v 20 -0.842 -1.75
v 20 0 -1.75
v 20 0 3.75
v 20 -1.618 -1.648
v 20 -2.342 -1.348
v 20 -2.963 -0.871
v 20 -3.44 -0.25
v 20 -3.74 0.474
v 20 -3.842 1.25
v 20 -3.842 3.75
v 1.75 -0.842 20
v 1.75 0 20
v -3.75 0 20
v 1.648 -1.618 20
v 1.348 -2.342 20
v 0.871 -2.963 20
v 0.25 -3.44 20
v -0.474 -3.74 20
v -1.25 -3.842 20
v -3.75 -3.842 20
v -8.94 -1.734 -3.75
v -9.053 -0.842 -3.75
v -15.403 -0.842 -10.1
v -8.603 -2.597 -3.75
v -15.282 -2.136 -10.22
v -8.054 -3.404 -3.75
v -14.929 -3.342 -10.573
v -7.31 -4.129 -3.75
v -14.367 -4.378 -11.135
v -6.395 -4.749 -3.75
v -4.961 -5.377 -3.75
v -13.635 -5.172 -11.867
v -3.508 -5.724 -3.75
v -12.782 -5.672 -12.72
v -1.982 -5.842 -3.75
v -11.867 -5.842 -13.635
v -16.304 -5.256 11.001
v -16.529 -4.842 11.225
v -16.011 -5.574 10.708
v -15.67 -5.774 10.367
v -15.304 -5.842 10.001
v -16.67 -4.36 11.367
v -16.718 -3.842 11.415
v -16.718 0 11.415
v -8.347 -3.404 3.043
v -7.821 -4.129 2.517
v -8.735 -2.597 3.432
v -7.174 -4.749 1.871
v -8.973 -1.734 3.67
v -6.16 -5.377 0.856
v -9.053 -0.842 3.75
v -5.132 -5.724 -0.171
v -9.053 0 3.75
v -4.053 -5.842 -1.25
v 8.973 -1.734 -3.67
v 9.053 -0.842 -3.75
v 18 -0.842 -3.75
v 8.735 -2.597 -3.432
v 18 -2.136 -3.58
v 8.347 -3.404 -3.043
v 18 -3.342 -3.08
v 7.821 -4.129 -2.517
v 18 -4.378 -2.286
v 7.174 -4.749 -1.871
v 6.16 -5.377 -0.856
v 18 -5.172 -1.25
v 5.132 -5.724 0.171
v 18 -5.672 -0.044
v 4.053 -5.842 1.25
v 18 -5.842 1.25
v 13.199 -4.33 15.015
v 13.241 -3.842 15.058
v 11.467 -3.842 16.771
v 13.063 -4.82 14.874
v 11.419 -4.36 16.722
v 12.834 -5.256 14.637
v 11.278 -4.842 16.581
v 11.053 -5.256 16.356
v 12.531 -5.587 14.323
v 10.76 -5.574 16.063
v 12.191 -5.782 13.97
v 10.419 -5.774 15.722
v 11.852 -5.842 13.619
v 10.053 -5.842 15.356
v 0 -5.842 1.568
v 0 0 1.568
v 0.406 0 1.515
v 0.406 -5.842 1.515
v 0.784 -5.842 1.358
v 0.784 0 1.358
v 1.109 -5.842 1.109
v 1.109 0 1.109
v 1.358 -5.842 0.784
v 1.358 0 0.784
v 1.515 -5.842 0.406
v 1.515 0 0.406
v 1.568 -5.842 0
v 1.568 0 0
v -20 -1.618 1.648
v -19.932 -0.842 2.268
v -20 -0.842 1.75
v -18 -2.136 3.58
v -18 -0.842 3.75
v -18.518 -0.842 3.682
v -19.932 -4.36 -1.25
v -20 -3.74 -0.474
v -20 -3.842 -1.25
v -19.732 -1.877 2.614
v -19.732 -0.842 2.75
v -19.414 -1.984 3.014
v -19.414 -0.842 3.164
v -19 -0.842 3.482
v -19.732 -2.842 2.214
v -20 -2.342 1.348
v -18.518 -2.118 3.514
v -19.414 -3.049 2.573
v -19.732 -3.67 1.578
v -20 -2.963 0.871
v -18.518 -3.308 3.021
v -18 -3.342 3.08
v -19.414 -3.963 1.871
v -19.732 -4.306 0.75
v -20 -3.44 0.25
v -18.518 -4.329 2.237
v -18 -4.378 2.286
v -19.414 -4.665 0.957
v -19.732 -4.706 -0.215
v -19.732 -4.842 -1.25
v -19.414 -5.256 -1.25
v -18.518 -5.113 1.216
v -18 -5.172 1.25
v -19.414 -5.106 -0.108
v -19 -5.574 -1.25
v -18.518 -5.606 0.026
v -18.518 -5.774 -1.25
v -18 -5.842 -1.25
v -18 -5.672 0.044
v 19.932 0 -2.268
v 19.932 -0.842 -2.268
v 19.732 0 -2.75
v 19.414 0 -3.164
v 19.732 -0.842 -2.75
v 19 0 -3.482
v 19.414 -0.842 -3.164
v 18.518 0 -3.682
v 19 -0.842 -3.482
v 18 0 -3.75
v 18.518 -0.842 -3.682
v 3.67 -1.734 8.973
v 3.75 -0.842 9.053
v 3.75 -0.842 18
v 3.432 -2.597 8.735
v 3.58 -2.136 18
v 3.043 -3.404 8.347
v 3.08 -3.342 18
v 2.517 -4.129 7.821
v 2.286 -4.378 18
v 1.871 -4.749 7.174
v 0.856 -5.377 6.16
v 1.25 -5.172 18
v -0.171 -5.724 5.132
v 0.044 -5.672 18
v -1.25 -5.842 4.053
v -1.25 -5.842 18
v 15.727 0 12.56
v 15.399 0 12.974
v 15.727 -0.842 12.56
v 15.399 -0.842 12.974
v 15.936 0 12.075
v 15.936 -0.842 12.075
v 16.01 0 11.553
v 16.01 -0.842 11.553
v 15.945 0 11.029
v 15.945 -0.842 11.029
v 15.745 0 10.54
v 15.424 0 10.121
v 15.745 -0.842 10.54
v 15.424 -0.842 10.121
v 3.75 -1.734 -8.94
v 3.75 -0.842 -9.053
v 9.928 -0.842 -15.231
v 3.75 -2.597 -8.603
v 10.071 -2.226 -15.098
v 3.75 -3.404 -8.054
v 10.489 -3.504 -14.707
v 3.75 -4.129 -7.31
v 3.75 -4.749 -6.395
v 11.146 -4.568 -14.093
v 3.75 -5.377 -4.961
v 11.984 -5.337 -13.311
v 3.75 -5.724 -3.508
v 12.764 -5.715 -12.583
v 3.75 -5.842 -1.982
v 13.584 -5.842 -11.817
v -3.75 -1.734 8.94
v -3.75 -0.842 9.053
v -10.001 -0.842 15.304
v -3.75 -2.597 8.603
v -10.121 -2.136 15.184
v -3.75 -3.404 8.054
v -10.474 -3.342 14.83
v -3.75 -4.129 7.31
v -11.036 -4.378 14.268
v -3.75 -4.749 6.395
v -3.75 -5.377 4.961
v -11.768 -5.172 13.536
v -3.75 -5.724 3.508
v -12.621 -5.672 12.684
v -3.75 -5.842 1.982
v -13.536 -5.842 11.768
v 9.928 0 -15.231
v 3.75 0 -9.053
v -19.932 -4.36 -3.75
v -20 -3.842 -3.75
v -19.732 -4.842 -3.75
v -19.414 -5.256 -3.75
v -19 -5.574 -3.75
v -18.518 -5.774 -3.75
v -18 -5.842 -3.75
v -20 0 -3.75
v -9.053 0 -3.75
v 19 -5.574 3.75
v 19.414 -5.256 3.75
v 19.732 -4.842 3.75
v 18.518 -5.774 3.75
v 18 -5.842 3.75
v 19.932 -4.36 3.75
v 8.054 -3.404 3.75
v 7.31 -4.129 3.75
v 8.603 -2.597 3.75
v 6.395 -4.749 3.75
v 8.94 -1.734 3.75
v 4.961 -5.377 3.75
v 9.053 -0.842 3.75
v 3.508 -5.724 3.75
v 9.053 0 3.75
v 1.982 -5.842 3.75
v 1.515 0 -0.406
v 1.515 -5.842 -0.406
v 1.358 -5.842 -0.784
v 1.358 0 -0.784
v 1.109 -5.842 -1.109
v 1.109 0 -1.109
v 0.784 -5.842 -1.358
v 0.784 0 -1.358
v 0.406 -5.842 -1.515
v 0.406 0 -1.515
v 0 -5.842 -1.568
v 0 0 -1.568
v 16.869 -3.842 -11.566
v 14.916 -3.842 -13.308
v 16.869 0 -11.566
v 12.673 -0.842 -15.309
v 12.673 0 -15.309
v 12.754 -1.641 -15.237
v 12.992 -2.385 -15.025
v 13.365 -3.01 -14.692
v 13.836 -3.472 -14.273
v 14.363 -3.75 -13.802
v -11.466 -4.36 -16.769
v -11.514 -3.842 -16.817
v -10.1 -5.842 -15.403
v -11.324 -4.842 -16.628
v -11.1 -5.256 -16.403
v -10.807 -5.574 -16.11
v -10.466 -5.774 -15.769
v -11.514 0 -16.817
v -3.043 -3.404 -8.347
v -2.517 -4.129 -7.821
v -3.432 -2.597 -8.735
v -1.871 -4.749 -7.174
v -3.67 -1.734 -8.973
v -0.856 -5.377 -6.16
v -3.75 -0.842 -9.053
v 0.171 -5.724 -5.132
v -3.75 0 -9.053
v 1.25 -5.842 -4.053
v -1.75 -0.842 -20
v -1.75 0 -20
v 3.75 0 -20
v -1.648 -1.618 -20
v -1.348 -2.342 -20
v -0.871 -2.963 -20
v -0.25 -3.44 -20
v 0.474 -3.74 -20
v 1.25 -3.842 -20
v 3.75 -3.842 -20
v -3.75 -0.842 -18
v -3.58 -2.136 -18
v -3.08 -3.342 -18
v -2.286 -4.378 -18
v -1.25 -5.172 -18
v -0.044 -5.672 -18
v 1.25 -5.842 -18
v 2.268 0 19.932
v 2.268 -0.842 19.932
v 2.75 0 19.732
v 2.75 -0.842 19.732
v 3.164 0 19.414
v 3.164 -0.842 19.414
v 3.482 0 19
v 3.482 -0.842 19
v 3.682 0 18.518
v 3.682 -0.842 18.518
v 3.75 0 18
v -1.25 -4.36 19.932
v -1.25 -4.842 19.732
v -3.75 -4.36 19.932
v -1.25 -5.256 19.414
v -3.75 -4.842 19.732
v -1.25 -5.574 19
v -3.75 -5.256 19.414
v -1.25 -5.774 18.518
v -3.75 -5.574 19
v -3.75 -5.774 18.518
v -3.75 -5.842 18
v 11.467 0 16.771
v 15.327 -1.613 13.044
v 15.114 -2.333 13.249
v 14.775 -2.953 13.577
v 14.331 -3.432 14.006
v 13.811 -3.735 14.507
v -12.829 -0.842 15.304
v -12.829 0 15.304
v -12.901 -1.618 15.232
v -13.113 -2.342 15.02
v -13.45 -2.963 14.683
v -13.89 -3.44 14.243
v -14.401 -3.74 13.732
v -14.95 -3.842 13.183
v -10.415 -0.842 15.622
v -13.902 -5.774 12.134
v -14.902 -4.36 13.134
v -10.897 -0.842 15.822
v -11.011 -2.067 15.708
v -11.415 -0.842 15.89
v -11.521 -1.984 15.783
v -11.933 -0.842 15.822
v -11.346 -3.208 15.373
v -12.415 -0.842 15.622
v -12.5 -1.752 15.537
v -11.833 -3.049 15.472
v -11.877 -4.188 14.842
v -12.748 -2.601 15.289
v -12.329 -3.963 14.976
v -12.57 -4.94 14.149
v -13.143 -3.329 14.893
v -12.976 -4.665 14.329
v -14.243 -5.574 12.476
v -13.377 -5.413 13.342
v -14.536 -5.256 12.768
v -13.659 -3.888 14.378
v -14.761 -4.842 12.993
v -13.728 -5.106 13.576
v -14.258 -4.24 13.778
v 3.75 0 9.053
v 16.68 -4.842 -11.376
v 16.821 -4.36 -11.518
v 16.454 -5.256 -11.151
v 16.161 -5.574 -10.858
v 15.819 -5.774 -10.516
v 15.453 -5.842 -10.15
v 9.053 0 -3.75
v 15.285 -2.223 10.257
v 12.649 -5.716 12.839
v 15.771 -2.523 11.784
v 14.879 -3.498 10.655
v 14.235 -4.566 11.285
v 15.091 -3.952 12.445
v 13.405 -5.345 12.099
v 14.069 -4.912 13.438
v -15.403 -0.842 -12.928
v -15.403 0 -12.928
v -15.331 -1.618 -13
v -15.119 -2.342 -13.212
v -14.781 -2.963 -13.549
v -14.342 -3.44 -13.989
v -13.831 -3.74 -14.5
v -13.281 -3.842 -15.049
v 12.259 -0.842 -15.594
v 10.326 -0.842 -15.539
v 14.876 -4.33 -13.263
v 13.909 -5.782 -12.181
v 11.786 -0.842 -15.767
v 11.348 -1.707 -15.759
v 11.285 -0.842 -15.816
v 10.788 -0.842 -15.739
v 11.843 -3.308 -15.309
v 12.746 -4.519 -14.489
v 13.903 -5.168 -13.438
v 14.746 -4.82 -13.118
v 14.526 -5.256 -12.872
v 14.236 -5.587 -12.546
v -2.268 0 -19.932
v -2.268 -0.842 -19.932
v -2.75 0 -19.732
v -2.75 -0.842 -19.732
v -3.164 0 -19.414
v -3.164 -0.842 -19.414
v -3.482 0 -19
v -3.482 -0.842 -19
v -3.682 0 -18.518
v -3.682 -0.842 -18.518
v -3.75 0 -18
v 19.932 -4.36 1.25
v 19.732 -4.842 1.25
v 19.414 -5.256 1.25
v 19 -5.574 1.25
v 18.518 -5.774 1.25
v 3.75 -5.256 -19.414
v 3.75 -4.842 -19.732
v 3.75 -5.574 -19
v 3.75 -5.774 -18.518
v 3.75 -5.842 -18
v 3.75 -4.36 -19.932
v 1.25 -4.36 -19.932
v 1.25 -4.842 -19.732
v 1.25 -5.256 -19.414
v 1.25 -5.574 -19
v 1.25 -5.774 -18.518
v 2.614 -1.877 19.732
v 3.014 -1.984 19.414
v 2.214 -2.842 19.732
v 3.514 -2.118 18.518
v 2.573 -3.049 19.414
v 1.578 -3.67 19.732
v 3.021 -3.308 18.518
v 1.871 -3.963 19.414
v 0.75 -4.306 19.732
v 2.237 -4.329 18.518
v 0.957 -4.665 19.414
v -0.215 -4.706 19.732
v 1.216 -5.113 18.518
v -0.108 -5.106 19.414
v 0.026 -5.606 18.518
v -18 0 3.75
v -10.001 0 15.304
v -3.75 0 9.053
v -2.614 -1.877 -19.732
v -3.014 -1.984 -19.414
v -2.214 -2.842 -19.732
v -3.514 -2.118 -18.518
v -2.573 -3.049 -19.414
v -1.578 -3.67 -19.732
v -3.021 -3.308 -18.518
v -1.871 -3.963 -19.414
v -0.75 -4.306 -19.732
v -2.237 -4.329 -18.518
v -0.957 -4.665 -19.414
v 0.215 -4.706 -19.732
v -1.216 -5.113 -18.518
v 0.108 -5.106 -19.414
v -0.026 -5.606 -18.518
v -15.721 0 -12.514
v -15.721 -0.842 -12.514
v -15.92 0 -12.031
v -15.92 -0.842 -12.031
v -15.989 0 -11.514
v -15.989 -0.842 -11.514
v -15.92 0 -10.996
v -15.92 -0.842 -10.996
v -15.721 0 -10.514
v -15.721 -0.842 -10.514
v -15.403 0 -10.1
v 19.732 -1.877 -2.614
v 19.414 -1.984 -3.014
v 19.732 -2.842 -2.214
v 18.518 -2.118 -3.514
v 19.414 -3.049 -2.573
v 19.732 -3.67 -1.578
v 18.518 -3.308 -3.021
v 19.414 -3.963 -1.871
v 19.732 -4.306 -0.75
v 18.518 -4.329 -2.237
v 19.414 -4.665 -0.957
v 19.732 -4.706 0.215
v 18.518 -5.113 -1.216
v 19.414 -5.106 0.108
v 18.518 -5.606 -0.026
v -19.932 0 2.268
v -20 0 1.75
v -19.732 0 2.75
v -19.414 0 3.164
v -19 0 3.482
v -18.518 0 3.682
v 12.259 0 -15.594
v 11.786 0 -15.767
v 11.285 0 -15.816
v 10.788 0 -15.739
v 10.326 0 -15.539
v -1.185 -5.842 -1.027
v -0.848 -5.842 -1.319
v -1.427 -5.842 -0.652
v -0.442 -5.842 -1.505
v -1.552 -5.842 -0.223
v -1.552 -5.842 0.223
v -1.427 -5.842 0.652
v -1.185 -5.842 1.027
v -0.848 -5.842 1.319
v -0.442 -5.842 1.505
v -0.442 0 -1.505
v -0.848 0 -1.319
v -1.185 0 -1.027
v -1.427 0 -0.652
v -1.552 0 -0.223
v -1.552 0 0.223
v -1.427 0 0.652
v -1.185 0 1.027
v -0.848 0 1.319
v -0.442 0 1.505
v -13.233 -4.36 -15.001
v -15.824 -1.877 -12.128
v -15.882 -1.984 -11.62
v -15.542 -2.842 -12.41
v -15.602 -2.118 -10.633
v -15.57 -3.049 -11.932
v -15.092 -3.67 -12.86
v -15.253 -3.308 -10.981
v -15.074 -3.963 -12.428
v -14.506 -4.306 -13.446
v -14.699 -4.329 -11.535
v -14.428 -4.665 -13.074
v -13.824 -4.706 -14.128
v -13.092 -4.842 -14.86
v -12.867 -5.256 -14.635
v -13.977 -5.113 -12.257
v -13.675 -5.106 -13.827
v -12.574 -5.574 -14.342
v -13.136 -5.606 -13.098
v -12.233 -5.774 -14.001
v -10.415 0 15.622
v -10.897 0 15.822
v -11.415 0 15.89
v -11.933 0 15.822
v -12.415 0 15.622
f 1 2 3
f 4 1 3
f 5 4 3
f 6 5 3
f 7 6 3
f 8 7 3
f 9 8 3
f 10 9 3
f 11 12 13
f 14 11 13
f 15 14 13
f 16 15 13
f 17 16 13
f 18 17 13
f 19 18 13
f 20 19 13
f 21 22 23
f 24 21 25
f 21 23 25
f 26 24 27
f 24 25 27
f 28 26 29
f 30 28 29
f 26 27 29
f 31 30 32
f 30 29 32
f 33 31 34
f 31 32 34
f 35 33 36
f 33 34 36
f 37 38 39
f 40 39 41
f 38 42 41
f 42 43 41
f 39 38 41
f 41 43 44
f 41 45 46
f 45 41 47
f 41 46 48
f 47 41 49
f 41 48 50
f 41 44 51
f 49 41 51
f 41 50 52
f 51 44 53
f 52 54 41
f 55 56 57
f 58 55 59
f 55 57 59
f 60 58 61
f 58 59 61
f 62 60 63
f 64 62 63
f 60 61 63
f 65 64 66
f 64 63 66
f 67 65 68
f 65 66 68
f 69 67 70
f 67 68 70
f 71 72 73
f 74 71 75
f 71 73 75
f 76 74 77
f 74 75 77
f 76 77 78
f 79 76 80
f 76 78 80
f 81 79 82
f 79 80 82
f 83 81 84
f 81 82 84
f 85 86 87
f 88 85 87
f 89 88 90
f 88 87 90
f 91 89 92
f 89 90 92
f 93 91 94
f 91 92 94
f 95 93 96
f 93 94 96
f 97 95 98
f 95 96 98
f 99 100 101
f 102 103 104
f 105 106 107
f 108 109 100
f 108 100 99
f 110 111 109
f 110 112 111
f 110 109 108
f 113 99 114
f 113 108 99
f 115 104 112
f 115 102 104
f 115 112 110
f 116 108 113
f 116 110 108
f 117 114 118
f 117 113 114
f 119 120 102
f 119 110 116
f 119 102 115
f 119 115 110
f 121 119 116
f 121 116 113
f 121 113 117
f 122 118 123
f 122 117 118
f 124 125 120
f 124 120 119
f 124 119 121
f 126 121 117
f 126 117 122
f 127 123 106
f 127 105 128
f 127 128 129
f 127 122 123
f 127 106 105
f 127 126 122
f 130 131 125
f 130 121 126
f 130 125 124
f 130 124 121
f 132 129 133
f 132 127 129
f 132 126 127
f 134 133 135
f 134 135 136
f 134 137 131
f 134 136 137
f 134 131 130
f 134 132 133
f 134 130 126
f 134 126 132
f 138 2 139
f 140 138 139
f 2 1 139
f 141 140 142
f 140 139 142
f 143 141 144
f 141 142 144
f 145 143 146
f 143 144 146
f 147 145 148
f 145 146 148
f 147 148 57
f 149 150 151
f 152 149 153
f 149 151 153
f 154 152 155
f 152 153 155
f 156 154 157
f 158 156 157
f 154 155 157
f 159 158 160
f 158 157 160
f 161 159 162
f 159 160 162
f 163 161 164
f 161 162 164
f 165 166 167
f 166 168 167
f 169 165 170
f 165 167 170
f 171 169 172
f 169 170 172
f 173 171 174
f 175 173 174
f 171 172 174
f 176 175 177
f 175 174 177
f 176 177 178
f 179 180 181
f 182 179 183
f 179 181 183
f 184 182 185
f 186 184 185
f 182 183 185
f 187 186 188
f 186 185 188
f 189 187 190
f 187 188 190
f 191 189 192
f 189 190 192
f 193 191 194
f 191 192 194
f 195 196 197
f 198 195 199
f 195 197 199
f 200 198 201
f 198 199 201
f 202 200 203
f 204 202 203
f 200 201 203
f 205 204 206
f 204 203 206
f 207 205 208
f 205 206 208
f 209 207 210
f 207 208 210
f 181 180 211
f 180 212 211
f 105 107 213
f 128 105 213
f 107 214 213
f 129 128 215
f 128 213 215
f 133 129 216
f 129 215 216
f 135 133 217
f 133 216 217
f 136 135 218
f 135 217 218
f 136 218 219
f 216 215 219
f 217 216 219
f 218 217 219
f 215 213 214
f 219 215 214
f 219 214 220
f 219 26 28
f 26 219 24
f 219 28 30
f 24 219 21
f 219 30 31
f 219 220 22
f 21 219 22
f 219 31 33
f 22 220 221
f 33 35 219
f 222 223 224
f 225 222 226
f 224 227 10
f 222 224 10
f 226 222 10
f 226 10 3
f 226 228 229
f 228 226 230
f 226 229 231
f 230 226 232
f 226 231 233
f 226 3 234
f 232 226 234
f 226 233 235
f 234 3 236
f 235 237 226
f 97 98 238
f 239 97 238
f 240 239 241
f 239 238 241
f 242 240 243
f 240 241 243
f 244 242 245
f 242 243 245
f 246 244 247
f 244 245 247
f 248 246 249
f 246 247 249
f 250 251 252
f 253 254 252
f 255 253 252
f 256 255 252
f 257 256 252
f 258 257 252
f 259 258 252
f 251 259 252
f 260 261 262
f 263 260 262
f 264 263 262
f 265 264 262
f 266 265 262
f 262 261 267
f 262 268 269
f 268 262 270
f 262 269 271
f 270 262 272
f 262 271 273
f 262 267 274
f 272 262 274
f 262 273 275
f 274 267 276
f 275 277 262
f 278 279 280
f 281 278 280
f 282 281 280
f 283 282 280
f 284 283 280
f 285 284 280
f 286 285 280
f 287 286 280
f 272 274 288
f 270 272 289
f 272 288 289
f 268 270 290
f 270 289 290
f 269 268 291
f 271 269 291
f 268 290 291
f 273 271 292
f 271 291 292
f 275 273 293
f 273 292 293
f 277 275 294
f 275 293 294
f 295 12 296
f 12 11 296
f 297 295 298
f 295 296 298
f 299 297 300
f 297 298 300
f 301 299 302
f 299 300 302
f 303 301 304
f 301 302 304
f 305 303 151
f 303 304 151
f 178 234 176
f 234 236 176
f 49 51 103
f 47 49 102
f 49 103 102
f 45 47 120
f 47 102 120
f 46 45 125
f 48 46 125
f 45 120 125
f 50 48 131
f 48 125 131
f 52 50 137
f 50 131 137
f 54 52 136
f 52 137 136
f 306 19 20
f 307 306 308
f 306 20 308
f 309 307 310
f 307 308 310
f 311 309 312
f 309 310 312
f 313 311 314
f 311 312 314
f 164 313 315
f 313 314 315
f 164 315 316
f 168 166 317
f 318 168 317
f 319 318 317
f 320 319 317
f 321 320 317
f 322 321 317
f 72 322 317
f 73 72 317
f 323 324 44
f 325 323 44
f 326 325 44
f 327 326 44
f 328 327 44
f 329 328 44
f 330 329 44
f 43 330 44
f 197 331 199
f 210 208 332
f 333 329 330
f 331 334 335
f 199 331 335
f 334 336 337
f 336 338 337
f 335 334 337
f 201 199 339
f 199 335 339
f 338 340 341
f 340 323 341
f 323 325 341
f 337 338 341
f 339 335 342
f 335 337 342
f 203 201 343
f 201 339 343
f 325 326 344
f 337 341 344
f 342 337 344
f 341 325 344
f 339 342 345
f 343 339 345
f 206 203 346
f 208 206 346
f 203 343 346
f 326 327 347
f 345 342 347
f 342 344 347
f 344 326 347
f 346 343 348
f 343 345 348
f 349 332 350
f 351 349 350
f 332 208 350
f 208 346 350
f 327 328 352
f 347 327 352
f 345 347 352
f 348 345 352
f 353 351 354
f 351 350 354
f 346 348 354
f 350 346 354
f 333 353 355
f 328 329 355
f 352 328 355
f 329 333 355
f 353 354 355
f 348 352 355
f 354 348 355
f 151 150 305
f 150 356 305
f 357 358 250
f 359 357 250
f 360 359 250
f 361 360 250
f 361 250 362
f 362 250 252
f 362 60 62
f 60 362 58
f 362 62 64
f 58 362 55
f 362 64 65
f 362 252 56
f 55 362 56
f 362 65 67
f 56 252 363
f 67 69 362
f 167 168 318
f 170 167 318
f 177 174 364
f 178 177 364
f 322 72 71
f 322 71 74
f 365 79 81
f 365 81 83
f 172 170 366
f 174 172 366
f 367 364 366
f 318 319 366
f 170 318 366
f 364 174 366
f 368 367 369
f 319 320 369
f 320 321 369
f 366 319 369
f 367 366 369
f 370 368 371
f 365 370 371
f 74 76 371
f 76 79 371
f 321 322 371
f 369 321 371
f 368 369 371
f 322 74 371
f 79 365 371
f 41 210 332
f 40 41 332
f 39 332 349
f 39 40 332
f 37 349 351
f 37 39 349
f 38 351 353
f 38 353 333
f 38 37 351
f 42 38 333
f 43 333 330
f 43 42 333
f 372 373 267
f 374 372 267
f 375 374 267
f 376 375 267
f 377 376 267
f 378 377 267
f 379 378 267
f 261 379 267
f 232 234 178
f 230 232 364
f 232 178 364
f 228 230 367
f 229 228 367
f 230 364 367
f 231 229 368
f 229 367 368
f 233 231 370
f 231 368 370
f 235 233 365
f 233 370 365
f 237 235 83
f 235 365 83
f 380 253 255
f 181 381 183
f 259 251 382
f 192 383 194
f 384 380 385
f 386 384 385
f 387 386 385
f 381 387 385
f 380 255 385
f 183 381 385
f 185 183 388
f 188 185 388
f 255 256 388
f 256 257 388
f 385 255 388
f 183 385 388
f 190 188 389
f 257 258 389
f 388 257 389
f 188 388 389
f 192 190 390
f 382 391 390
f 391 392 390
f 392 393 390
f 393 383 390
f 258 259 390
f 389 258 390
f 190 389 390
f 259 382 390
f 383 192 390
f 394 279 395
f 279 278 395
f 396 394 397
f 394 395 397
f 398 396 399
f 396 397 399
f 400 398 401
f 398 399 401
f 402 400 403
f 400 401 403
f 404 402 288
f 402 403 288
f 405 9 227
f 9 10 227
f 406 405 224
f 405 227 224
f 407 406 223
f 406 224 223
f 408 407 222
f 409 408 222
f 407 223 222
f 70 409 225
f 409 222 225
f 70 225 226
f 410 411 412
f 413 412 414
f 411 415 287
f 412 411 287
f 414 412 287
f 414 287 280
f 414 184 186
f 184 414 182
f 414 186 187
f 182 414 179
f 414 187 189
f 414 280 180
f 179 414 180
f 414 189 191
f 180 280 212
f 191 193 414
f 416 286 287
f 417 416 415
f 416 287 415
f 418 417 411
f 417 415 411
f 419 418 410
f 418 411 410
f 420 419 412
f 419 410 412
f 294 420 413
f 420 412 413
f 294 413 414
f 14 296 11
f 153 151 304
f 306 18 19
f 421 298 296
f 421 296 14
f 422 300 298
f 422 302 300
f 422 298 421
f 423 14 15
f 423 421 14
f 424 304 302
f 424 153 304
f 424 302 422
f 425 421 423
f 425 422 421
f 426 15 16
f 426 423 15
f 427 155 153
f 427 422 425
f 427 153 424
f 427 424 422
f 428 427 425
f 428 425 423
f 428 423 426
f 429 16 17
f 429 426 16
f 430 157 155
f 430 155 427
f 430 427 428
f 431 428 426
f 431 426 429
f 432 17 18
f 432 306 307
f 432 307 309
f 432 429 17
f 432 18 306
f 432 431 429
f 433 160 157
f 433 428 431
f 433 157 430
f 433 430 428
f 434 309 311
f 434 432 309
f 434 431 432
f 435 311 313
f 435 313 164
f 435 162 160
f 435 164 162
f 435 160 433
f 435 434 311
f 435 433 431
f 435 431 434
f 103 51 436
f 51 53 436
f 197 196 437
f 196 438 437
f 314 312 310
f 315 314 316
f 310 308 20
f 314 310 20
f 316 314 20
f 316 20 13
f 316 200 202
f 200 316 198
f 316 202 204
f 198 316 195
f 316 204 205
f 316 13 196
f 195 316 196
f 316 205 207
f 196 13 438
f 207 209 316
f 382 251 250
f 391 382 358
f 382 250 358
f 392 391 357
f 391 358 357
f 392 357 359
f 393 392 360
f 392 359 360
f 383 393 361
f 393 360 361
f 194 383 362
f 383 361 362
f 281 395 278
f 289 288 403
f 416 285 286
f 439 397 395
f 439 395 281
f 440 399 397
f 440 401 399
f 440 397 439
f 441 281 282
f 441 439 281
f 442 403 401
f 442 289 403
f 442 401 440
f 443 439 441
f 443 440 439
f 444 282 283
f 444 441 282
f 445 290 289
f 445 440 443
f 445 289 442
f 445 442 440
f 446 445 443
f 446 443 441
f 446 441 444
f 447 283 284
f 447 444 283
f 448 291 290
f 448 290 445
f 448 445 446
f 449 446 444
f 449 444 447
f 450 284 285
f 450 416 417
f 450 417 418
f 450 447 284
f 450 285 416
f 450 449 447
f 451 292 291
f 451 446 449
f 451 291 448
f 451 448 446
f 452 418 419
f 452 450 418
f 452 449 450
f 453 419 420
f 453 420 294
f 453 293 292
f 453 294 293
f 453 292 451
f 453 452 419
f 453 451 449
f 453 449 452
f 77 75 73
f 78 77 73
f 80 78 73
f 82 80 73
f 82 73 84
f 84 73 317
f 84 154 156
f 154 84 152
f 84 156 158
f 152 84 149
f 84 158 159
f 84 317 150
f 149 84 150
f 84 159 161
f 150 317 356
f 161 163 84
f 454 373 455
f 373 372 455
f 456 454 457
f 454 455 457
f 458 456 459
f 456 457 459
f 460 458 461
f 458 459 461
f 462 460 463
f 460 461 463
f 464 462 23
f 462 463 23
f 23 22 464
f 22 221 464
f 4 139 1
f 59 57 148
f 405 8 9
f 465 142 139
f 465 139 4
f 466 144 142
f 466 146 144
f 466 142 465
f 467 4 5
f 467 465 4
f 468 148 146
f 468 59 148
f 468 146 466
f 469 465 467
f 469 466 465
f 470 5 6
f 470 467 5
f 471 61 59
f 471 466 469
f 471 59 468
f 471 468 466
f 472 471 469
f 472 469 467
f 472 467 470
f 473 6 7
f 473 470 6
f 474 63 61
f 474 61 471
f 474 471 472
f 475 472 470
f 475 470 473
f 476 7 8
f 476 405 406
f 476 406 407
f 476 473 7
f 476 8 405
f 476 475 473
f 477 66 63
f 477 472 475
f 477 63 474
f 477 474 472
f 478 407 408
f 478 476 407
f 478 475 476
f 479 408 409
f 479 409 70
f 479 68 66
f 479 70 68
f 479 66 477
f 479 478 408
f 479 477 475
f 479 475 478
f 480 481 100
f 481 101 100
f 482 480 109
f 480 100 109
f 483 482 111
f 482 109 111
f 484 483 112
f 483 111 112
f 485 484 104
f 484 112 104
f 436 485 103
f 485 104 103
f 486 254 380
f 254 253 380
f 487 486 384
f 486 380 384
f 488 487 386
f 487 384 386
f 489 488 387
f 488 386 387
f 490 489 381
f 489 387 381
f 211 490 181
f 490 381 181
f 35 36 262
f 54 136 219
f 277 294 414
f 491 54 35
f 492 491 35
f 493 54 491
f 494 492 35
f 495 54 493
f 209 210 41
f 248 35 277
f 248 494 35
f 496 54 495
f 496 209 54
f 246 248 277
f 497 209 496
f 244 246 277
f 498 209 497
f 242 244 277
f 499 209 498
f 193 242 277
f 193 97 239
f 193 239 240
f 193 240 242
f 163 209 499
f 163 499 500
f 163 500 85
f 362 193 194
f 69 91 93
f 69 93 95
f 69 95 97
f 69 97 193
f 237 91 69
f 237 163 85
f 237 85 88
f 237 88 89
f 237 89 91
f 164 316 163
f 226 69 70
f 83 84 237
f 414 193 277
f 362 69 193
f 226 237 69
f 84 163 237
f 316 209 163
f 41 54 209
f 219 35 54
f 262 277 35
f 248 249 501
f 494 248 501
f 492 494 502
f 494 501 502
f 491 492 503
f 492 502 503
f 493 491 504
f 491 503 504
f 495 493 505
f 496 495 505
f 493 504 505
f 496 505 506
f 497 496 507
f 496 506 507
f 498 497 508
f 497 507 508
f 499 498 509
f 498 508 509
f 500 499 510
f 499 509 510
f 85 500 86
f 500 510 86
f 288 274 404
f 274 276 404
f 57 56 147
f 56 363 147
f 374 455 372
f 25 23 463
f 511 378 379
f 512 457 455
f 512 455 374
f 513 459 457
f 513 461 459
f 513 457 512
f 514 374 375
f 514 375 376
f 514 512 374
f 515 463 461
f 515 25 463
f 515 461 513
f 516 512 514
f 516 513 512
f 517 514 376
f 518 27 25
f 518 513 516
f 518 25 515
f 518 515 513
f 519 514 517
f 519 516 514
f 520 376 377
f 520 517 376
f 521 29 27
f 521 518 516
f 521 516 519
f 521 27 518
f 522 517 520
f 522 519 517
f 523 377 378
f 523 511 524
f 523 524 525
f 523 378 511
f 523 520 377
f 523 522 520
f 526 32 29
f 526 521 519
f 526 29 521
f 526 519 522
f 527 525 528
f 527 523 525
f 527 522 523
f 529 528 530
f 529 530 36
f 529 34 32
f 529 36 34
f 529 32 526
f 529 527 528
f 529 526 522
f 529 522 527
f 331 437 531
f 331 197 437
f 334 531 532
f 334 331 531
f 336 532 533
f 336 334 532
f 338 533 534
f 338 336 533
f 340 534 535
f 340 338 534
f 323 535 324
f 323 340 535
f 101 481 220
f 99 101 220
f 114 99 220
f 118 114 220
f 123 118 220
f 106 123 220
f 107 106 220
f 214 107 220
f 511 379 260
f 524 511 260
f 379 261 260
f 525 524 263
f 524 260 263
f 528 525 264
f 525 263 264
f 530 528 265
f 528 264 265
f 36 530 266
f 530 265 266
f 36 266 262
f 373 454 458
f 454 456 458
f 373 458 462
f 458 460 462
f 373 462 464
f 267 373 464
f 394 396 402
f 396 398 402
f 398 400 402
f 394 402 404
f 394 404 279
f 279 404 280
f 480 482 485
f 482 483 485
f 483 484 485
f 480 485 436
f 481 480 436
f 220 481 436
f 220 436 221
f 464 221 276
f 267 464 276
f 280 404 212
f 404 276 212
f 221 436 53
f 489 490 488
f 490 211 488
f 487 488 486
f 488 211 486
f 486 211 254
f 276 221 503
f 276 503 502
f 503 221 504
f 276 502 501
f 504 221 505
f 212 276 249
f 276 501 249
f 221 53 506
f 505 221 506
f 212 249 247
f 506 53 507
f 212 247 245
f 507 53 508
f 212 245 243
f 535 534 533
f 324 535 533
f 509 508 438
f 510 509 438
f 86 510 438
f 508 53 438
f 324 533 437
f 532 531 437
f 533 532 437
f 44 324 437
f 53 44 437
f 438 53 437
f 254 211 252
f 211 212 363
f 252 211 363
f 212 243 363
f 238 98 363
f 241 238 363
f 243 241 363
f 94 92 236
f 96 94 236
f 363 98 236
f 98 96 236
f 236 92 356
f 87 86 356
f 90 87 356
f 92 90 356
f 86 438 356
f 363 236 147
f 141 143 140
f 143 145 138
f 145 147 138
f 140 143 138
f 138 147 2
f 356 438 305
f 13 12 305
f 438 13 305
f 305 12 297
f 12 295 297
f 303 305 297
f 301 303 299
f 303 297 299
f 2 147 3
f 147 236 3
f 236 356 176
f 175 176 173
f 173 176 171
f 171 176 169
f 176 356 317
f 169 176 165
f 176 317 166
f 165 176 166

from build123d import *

# Parameters (mm, degrees)
F1_DEPTH = 5.842
F2_R     = 5
F3_R     = 2


with BuildPart() as f1:
    # F0 (on Front) → F1 (new body)
    with BuildSketch(Plane.XZ):
        Polygon((0, 5.3033008589), (3.75, 9.0533008589), (3.75, 20), (-3.75, 20), (-3.75, 9.0533008589), align=None)
        Polygon((3.75, -20), (3.75, -9.0533008589), (0, -5.3033008589), (-3.75, -9.0533008589), (-3.75, -20), align=None)
        Polygon((-3.75, 3.75), (-3.75, 9.0533008589), (-11.4148991575, 16.7182000164), (-16.7182000164, 11.4148991575), (-9.0533008589, 3.75), align=None)
        Polygon((-11.5137192974, -16.8170201563), (-3.75, -9.0533008589), (-3.75, -3.75), (-9.0533008589, -3.75), (-16.8170201563, -11.5137192974), align=None)
        Polygon((3.75, 9.0533008589), (3.75, 3.75), (9.0533008589, 3.75), (16.8634883625, 11.5601875036), (11.4672510912, 16.7705519501), align=None)
        Polygon((16.86937209, -11.5660712311), (9.0533008589, -3.75), (3.75, -3.75), (3.75, -9.0533008589), (11.2637270839, -16.5670279428), align=None)
        Polygon((-9.0533008589, -3.75), (-5.3033008589, 0), (-9.0533008589, 3.75), (-20, 3.75), (-20, -3.75), align=None)
        Polygon((9.0533008589, 3.75), (5.3033008589, 0), (9.0533008589, -3.75), (20, -3.75), (20, 3.75), align=None)
        with BuildLine():
            ThreePointArc((3.75, 3.3071891388), (4.6193976626, 1.9134171618), (4.9901862962, 0.3131145627))
            Line((4.9901862962, 0.3131145627), (5.3033008589, 0))
            Line((5.3033008589, 0), (9.0533008589, 3.75))
            Line((9.0533008589, 3.75), (3.75, 3.75))
            Line((3.75, 3.75), (3.75, 3.3071891388))
        make_face()
        with BuildLine():
            ThreePointArc((0.3131145627, 4.9901862962), (1.9134171618, 4.6193976626), (3.3071891388, 3.75))
            Line((3.3071891388, 3.75), (3.75, 3.75))
            Line((3.75, 3.75), (3.75, 9.0533008589))
            Line((3.75, 9.0533008589), (0, 5.3033008589))
            Line((0, 5.3033008589), (0.3131145627, 4.9901862962))
        make_face()
        with BuildLine():
            ThreePointArc((-3.3071891388, 3.75), (-1.9134171618, 4.6193976626), (-0.3131145627, 4.9901862962))
            Line((-0.3131145627, 4.9901862962), (0, 5.3033008589))
            Line((0, 5.3033008589), (-3.75, 9.0533008589))
            Line((-3.75, 9.0533008589), (-3.75, 3.75))
            Line((-3.75, 3.75), (-3.3071891388, 3.75))
        make_face()
        with BuildLine():
            ThreePointArc((-4.9901862962, 0.3131145627), (-4.6193976626, 1.9134171618), (-3.75, 3.3071891388))
            Line((-3.75, 3.3071891388), (-3.75, 3.75))
            Line((-3.75, 3.75), (-9.0533008589, 3.75))
            Line((-9.0533008589, 3.75), (-5.3033008589, 0))
            Line((-5.3033008589, 0), (-4.9901862962, 0.3131145627))
        make_face()
        with BuildLine():
            Line((-3.75, -3.75), (-3.75, -3.3071891388))
            ThreePointArc((-3.75, -3.3071891388), (-4.6193976626, -1.9134171618), (-4.9901862962, -0.3131145627))
            Line((-4.9901862962, -0.3131145627), (-5.3033008589, 0))
            Line((-5.3033008589, 0), (-9.0533008589, -3.75))
            Line((-9.0533008589, -3.75), (-3.75, -3.75))
        make_face()
        with BuildLine():
            Line((3.75, -3.75), (3.3071891388, -3.75))
            ThreePointArc((3.3071891388, -3.75), (1.9134171618, -4.6193976626), (0.3131145627, -4.9901862962))
            Line((0.3131145627, -4.9901862962), (0, -5.3033008589))
            Line((0, -5.3033008589), (3.75, -9.0533008589))
            Line((3.75, -9.0533008589), (3.75, -3.75))
        make_face()
        with BuildLine():
            Line((5.3033008589, 0), (4.9901862962, -0.3131145627))
            ThreePointArc((4.9901862962, -0.3131145627), (4.6193976626, -1.9134171618), (3.75, -3.3071891388))
            Line((3.75, -3.3071891388), (3.75, -3.75))
            Line((3.75, -3.75), (9.0533008589, -3.75))
            Line((9.0533008589, -3.75), (5.3033008589, 0))
        make_face()
        with BuildLine():
            Line((0, -5.3033008589), (-0.3131145627, -4.9901862962))
            ThreePointArc((-0.3131145627, -4.9901862962), (-1.9134171618, -4.6193976626), (-3.3071891388, -3.75))
            Line((-3.3071891388, -3.75), (-3.75, -3.75))
            Line((-3.75, -3.75), (-3.75, -9.0533008589))
            Line((-3.75, -9.0533008589), (0, -5.3033008589))
        make_face()
        with BuildLine():
            Line((-3.75, -3.3071891388), (-3.75, -1.5533008589))
            Line((-3.75, -1.5533008589), (-4.9901862962, -0.3131145627))
            ThreePointArc((-4.9901862962, -0.3131145627), (-4.6193976626, -1.9134171618), (-3.75, -3.3071891388))
        make_face()
        with BuildLine():
            Line((-1.5533008589, 3.75), (1.5533008589, 3.75))
            Line((1.5533008589, 3.75), (0.3131145627, 4.9901862962))
            ThreePointArc((0.3131145627, 4.9901862962), (0, 5), (-0.3131145627, 4.9901862962))
            Line((-0.3131145627, 4.9901862962), (-1.5533008589, 3.75))
        make_face()
        with BuildLine():
            ThreePointArc((4.9901862962, -0.3131145627), (4.9975459718, -0.1566341583), (5, 0))
            ThreePointArc((5, 0), (4.9975459718, 0.1566341583), (4.9901862962, 0.3131145627))
            Line((4.9901862962, 0.3131145627), (3.75, 1.5533008589))
            Line((3.75, 1.5533008589), (3.75, -1.5533008589))
            Line((3.75, -1.5533008589), (4.9901862962, -0.3131145627))
        make_face()
        with BuildLine():
            Line((-3.75, -1.5533008589), (-3.75, 1.5533008589))
            Line((-3.75, 1.5533008589), (-4.9901862962, 0.3131145627))
            ThreePointArc((-4.9901862962, 0.3131145627), (-5, 0), (-4.9901862962, -0.3131145627))
            Line((-4.9901862962, -0.3131145627), (-3.75, -1.5533008589))
        make_face()
        with BuildLine():
            Line((0, -5.3033008589), (0.3131145627, -4.9901862962))
            ThreePointArc((0.3131145627, -4.9901862962), (0, -5), (-0.3131145627, -4.9901862962))
            Line((-0.3131145627, -4.9901862962), (0, -5.3033008589))
        make_face()
        with BuildLine():
            ThreePointArc((-3.75, 3.3071891388), (-3.5355339059, 3.5355339059), (-3.3071891388, 3.75))
            Line((-3.3071891388, 3.75), (-3.75, 3.75))
            Line((-3.75, 3.75), (-3.75, 3.3071891388))
        make_face()
        Polygon((3.75, -1.5533008589), (3.75, 1.5533008589), (1.5533008589, 3.75), (-1.5533008589, 3.75), (-3.75, 1.5533008589), (-3.75, -1.5533008589), (-1.5533008589, -3.75), (1.5533008589, -3.75), align=None)
        with BuildLine():
            ThreePointArc((0, 1.56845), (1.109061631, 1.109061631), (1.56845, 0))
            ThreePointArc((1.56845, 0), (1.109061631, -1.109061631), (0, -1.56845))
            ThreePointArc((0, -1.56845), (-1.56845, 0), (0, 1.56845))
        make_face(mode=Mode.SUBTRACT)
        with BuildLine():
            Line((-3.3071891388, -3.75), (-1.5533008589, -3.75))
            Line((-1.5533008589, -3.75), (-3.75, -1.5533008589))
            Line((-3.75, -1.5533008589), (-3.75, -3.3071891388))
            ThreePointArc((-3.75, -3.3071891388), (-3.5355339059, -3.5355339059), (-3.3071891388, -3.75))
        make_face()
        with BuildLine():
            ThreePointArc((3.3071891388, -3.75), (3.5355339059, -3.5355339059), (3.75, -3.3071891388))
            Line((3.75, -3.3071891388), (3.75, -1.5533008589))
            Line((3.75, -1.5533008589), (1.5533008589, -3.75))
            Line((1.5533008589, -3.75), (3.3071891388, -3.75))
        make_face()
        with BuildLine():
            ThreePointArc((3.3071891388, 3.75), (3.5355339059, 3.5355339059), (3.75, 3.3071891388))
            Line((3.75, 3.3071891388), (3.75, 3.75))
            Line((3.75, 3.75), (3.3071891388, 3.75))
        make_face()
        with BuildLine():
            ThreePointArc((3.75, -3.3071891388), (4.6193976626, -1.9134171618), (4.9901862962, -0.3131145627))
            Line((4.9901862962, -0.3131145627), (3.75, -1.5533008589))
            Line((3.75, -1.5533008589), (3.75, -3.3071891388))
        make_face()
        with BuildLine():
            Line((0.3131145627, -4.9901862962), (1.5533008589, -3.75))
            Line((1.5533008589, -3.75), (-1.5533008589, -3.75))
            Line((-1.5533008589, -3.75), (-0.3131145627, -4.9901862962))
            ThreePointArc((-0.3131145627, -4.9901862962), (0, -5), (0.3131145627, -4.9901862962))
        make_face()
        with BuildLine():
            Line((-3.75, 1.5533008589), (-1.5533008589, 3.75))
            Line((-1.5533008589, 3.75), (-3.3071891388, 3.75))
            ThreePointArc((-3.3071891388, 3.75), (-3.5355339059, 3.5355339059), (-3.75, 3.3071891388))
            Line((-3.75, 3.3071891388), (-3.75, 1.5533008589))
        make_face()
        with BuildLine():
            Line((-4.9901862962, 0.3131145627), (-3.75, 1.5533008589))
            Line((-3.75, 1.5533008589), (-3.75, 3.3071891388))
            ThreePointArc((-3.75, 3.3071891388), (-4.6193976626, 1.9134171618), (-4.9901862962, 0.3131145627))
        make_face()
        with BuildLine():
            Line((-3.3071891388, 3.75), (-1.5533008589, 3.75))
            Line((-1.5533008589, 3.75), (-0.3131145627, 4.9901862962))
            ThreePointArc((-0.3131145627, 4.9901862962), (-1.9134171618, 4.6193976626), (-3.3071891388, 3.75))
        make_face()
        with BuildLine():
            Line((-0.3131145627, -4.9901862962), (-1.5533008589, -3.75))
            Line((-1.5533008589, -3.75), (-3.3071891388, -3.75))
            ThreePointArc((-3.3071891388, -3.75), (-1.9134171618, -4.6193976626), (-0.3131145627, -4.9901862962))
        make_face()
        with BuildLine():
            ThreePointArc((0.3131145627, -4.9901862962), (1.9134171618, -4.6193976626), (3.3071891388, -3.75))
            Line((3.3071891388, -3.75), (1.5533008589, -3.75))
            Line((1.5533008589, -3.75), (0.3131145627, -4.9901862962))
        make_face()
        with BuildLine():
            Line((3.75, 1.5533008589), (3.75, 3.3071891388))
            ThreePointArc((3.75, 3.3071891388), (3.5355339059, 3.5355339059), (3.3071891388, 3.75))
            Line((3.3071891388, 3.75), (1.5533008589, 3.75))
            Line((1.5533008589, 3.75), (3.75, 1.5533008589))
        make_face()
        with BuildLine():
            Line((1.5533008589, 3.75), (3.3071891388, 3.75))
            ThreePointArc((3.3071891388, 3.75), (1.9134171618, 4.6193976626), (0.3131145627, 4.9901862962))
            Line((0.3131145627, 4.9901862962), (1.5533008589, 3.75))
        make_face()
        with BuildLine():
            Line((3.75, 1.5533008589), (4.9901862962, 0.3131145627))
            ThreePointArc((4.9901862962, 0.3131145627), (4.6193976626, 1.9134171618), (3.75, 3.3071891388))
            Line((3.75, 3.3071891388), (3.75, 1.5533008589))
        make_face()
        with BuildLine():
            ThreePointArc((-4.9901862962, -0.3131145627), (-5, 0), (-4.9901862962, 0.3131145627))
            Line((-4.9901862962, 0.3131145627), (-5.3033008589, 0))
            Line((-5.3033008589, 0), (-4.9901862962, -0.3131145627))
        make_face()
        with BuildLine():
            ThreePointArc((-0.3131145627, 4.9901862962), (0, 5), (0.3131145627, 4.9901862962))
            Line((0.3131145627, 4.9901862962), (0, 5.3033008589))
            Line((0, 5.3033008589), (-0.3131145627, 4.9901862962))
        make_face()
        with BuildLine():
            ThreePointArc((4.9901862962, 0.3131145627), (4.9975459718, 0.1566341583), (5, 0))
            ThreePointArc((5, 0), (4.9975459718, -0.1566341583), (4.9901862962, -0.3131145627))
            Line((4.9901862962, -0.3131145627), (5.3033008589, 0))
            Line((5.3033008589, 0), (4.9901862962, 0.3131145627))
        make_face()
        with BuildLine():
            Line((3.75, -3.75), (3.75, -3.3071891388))
            ThreePointArc((3.75, -3.3071891388), (3.5355339059, -3.5355339059), (3.3071891388, -3.75))
            Line((3.3071891388, -3.75), (3.75, -3.75))
        make_face()
        with BuildLine():
            Line((-3.75, -3.75), (-3.3071891388, -3.75))
            ThreePointArc((-3.3071891388, -3.75), (-3.5355339059, -3.5355339059), (-3.75, -3.3071891388))
            Line((-3.75, -3.3071891388), (-3.75, -3.75))
        make_face()
    extrude(amount=F1_DEPTH)

    # F2
    f2_edges = [f1.edges().sort_by_distance(p)[0] for p in [
        (-7.58245, -5.842, 12.88575),
        (3.75, -5.842, 14.52665),
        (12.958395, -5.842, 7.655094),
        (14.52665, -5.842, -3.75),
        (7.506864, -5.842, -12.810164),
        (-3.75, -5.842, -14.52665),
        (-12.935161, -5.842, -7.63186),
        (-14.52665, -5.842, 3.75),
    ]]
    fillet(f2_edges, radius=F2_R)

    # F3
    f3_edges = [f1.edges().sort_by_distance(p)[0] for p in [
        (-2.5, -5.842, 20),
        (2.285534, -4.377534, 20),
        (12.366624, -5.842, 15.902158),
        (15.80971, -4.37767, 12.577669),
        (20, -5.842, 2.5),
        (20, -4.377534, -2.285534),
        (-12.450433, -4.377534, 15.682666),
        (-15.834317, -5.842, 12.298783),
        (-20, -5.842, -2.5),
        (-20, -4.377534, 2.285534),
        (-12.397603, -5.842, -15.933137),
        (-15.781486, -4.377534, -12.549253),
        (-2.285534, -4.377534, -20),
        (2.5, -5.842, -20),
        (15.935098, -5.842, -12.399564),
        (12.359369, -4.378968, -15.589574),
    ]]
    fillet(f3_edges, radius=F3_R)


solid = f1.part
